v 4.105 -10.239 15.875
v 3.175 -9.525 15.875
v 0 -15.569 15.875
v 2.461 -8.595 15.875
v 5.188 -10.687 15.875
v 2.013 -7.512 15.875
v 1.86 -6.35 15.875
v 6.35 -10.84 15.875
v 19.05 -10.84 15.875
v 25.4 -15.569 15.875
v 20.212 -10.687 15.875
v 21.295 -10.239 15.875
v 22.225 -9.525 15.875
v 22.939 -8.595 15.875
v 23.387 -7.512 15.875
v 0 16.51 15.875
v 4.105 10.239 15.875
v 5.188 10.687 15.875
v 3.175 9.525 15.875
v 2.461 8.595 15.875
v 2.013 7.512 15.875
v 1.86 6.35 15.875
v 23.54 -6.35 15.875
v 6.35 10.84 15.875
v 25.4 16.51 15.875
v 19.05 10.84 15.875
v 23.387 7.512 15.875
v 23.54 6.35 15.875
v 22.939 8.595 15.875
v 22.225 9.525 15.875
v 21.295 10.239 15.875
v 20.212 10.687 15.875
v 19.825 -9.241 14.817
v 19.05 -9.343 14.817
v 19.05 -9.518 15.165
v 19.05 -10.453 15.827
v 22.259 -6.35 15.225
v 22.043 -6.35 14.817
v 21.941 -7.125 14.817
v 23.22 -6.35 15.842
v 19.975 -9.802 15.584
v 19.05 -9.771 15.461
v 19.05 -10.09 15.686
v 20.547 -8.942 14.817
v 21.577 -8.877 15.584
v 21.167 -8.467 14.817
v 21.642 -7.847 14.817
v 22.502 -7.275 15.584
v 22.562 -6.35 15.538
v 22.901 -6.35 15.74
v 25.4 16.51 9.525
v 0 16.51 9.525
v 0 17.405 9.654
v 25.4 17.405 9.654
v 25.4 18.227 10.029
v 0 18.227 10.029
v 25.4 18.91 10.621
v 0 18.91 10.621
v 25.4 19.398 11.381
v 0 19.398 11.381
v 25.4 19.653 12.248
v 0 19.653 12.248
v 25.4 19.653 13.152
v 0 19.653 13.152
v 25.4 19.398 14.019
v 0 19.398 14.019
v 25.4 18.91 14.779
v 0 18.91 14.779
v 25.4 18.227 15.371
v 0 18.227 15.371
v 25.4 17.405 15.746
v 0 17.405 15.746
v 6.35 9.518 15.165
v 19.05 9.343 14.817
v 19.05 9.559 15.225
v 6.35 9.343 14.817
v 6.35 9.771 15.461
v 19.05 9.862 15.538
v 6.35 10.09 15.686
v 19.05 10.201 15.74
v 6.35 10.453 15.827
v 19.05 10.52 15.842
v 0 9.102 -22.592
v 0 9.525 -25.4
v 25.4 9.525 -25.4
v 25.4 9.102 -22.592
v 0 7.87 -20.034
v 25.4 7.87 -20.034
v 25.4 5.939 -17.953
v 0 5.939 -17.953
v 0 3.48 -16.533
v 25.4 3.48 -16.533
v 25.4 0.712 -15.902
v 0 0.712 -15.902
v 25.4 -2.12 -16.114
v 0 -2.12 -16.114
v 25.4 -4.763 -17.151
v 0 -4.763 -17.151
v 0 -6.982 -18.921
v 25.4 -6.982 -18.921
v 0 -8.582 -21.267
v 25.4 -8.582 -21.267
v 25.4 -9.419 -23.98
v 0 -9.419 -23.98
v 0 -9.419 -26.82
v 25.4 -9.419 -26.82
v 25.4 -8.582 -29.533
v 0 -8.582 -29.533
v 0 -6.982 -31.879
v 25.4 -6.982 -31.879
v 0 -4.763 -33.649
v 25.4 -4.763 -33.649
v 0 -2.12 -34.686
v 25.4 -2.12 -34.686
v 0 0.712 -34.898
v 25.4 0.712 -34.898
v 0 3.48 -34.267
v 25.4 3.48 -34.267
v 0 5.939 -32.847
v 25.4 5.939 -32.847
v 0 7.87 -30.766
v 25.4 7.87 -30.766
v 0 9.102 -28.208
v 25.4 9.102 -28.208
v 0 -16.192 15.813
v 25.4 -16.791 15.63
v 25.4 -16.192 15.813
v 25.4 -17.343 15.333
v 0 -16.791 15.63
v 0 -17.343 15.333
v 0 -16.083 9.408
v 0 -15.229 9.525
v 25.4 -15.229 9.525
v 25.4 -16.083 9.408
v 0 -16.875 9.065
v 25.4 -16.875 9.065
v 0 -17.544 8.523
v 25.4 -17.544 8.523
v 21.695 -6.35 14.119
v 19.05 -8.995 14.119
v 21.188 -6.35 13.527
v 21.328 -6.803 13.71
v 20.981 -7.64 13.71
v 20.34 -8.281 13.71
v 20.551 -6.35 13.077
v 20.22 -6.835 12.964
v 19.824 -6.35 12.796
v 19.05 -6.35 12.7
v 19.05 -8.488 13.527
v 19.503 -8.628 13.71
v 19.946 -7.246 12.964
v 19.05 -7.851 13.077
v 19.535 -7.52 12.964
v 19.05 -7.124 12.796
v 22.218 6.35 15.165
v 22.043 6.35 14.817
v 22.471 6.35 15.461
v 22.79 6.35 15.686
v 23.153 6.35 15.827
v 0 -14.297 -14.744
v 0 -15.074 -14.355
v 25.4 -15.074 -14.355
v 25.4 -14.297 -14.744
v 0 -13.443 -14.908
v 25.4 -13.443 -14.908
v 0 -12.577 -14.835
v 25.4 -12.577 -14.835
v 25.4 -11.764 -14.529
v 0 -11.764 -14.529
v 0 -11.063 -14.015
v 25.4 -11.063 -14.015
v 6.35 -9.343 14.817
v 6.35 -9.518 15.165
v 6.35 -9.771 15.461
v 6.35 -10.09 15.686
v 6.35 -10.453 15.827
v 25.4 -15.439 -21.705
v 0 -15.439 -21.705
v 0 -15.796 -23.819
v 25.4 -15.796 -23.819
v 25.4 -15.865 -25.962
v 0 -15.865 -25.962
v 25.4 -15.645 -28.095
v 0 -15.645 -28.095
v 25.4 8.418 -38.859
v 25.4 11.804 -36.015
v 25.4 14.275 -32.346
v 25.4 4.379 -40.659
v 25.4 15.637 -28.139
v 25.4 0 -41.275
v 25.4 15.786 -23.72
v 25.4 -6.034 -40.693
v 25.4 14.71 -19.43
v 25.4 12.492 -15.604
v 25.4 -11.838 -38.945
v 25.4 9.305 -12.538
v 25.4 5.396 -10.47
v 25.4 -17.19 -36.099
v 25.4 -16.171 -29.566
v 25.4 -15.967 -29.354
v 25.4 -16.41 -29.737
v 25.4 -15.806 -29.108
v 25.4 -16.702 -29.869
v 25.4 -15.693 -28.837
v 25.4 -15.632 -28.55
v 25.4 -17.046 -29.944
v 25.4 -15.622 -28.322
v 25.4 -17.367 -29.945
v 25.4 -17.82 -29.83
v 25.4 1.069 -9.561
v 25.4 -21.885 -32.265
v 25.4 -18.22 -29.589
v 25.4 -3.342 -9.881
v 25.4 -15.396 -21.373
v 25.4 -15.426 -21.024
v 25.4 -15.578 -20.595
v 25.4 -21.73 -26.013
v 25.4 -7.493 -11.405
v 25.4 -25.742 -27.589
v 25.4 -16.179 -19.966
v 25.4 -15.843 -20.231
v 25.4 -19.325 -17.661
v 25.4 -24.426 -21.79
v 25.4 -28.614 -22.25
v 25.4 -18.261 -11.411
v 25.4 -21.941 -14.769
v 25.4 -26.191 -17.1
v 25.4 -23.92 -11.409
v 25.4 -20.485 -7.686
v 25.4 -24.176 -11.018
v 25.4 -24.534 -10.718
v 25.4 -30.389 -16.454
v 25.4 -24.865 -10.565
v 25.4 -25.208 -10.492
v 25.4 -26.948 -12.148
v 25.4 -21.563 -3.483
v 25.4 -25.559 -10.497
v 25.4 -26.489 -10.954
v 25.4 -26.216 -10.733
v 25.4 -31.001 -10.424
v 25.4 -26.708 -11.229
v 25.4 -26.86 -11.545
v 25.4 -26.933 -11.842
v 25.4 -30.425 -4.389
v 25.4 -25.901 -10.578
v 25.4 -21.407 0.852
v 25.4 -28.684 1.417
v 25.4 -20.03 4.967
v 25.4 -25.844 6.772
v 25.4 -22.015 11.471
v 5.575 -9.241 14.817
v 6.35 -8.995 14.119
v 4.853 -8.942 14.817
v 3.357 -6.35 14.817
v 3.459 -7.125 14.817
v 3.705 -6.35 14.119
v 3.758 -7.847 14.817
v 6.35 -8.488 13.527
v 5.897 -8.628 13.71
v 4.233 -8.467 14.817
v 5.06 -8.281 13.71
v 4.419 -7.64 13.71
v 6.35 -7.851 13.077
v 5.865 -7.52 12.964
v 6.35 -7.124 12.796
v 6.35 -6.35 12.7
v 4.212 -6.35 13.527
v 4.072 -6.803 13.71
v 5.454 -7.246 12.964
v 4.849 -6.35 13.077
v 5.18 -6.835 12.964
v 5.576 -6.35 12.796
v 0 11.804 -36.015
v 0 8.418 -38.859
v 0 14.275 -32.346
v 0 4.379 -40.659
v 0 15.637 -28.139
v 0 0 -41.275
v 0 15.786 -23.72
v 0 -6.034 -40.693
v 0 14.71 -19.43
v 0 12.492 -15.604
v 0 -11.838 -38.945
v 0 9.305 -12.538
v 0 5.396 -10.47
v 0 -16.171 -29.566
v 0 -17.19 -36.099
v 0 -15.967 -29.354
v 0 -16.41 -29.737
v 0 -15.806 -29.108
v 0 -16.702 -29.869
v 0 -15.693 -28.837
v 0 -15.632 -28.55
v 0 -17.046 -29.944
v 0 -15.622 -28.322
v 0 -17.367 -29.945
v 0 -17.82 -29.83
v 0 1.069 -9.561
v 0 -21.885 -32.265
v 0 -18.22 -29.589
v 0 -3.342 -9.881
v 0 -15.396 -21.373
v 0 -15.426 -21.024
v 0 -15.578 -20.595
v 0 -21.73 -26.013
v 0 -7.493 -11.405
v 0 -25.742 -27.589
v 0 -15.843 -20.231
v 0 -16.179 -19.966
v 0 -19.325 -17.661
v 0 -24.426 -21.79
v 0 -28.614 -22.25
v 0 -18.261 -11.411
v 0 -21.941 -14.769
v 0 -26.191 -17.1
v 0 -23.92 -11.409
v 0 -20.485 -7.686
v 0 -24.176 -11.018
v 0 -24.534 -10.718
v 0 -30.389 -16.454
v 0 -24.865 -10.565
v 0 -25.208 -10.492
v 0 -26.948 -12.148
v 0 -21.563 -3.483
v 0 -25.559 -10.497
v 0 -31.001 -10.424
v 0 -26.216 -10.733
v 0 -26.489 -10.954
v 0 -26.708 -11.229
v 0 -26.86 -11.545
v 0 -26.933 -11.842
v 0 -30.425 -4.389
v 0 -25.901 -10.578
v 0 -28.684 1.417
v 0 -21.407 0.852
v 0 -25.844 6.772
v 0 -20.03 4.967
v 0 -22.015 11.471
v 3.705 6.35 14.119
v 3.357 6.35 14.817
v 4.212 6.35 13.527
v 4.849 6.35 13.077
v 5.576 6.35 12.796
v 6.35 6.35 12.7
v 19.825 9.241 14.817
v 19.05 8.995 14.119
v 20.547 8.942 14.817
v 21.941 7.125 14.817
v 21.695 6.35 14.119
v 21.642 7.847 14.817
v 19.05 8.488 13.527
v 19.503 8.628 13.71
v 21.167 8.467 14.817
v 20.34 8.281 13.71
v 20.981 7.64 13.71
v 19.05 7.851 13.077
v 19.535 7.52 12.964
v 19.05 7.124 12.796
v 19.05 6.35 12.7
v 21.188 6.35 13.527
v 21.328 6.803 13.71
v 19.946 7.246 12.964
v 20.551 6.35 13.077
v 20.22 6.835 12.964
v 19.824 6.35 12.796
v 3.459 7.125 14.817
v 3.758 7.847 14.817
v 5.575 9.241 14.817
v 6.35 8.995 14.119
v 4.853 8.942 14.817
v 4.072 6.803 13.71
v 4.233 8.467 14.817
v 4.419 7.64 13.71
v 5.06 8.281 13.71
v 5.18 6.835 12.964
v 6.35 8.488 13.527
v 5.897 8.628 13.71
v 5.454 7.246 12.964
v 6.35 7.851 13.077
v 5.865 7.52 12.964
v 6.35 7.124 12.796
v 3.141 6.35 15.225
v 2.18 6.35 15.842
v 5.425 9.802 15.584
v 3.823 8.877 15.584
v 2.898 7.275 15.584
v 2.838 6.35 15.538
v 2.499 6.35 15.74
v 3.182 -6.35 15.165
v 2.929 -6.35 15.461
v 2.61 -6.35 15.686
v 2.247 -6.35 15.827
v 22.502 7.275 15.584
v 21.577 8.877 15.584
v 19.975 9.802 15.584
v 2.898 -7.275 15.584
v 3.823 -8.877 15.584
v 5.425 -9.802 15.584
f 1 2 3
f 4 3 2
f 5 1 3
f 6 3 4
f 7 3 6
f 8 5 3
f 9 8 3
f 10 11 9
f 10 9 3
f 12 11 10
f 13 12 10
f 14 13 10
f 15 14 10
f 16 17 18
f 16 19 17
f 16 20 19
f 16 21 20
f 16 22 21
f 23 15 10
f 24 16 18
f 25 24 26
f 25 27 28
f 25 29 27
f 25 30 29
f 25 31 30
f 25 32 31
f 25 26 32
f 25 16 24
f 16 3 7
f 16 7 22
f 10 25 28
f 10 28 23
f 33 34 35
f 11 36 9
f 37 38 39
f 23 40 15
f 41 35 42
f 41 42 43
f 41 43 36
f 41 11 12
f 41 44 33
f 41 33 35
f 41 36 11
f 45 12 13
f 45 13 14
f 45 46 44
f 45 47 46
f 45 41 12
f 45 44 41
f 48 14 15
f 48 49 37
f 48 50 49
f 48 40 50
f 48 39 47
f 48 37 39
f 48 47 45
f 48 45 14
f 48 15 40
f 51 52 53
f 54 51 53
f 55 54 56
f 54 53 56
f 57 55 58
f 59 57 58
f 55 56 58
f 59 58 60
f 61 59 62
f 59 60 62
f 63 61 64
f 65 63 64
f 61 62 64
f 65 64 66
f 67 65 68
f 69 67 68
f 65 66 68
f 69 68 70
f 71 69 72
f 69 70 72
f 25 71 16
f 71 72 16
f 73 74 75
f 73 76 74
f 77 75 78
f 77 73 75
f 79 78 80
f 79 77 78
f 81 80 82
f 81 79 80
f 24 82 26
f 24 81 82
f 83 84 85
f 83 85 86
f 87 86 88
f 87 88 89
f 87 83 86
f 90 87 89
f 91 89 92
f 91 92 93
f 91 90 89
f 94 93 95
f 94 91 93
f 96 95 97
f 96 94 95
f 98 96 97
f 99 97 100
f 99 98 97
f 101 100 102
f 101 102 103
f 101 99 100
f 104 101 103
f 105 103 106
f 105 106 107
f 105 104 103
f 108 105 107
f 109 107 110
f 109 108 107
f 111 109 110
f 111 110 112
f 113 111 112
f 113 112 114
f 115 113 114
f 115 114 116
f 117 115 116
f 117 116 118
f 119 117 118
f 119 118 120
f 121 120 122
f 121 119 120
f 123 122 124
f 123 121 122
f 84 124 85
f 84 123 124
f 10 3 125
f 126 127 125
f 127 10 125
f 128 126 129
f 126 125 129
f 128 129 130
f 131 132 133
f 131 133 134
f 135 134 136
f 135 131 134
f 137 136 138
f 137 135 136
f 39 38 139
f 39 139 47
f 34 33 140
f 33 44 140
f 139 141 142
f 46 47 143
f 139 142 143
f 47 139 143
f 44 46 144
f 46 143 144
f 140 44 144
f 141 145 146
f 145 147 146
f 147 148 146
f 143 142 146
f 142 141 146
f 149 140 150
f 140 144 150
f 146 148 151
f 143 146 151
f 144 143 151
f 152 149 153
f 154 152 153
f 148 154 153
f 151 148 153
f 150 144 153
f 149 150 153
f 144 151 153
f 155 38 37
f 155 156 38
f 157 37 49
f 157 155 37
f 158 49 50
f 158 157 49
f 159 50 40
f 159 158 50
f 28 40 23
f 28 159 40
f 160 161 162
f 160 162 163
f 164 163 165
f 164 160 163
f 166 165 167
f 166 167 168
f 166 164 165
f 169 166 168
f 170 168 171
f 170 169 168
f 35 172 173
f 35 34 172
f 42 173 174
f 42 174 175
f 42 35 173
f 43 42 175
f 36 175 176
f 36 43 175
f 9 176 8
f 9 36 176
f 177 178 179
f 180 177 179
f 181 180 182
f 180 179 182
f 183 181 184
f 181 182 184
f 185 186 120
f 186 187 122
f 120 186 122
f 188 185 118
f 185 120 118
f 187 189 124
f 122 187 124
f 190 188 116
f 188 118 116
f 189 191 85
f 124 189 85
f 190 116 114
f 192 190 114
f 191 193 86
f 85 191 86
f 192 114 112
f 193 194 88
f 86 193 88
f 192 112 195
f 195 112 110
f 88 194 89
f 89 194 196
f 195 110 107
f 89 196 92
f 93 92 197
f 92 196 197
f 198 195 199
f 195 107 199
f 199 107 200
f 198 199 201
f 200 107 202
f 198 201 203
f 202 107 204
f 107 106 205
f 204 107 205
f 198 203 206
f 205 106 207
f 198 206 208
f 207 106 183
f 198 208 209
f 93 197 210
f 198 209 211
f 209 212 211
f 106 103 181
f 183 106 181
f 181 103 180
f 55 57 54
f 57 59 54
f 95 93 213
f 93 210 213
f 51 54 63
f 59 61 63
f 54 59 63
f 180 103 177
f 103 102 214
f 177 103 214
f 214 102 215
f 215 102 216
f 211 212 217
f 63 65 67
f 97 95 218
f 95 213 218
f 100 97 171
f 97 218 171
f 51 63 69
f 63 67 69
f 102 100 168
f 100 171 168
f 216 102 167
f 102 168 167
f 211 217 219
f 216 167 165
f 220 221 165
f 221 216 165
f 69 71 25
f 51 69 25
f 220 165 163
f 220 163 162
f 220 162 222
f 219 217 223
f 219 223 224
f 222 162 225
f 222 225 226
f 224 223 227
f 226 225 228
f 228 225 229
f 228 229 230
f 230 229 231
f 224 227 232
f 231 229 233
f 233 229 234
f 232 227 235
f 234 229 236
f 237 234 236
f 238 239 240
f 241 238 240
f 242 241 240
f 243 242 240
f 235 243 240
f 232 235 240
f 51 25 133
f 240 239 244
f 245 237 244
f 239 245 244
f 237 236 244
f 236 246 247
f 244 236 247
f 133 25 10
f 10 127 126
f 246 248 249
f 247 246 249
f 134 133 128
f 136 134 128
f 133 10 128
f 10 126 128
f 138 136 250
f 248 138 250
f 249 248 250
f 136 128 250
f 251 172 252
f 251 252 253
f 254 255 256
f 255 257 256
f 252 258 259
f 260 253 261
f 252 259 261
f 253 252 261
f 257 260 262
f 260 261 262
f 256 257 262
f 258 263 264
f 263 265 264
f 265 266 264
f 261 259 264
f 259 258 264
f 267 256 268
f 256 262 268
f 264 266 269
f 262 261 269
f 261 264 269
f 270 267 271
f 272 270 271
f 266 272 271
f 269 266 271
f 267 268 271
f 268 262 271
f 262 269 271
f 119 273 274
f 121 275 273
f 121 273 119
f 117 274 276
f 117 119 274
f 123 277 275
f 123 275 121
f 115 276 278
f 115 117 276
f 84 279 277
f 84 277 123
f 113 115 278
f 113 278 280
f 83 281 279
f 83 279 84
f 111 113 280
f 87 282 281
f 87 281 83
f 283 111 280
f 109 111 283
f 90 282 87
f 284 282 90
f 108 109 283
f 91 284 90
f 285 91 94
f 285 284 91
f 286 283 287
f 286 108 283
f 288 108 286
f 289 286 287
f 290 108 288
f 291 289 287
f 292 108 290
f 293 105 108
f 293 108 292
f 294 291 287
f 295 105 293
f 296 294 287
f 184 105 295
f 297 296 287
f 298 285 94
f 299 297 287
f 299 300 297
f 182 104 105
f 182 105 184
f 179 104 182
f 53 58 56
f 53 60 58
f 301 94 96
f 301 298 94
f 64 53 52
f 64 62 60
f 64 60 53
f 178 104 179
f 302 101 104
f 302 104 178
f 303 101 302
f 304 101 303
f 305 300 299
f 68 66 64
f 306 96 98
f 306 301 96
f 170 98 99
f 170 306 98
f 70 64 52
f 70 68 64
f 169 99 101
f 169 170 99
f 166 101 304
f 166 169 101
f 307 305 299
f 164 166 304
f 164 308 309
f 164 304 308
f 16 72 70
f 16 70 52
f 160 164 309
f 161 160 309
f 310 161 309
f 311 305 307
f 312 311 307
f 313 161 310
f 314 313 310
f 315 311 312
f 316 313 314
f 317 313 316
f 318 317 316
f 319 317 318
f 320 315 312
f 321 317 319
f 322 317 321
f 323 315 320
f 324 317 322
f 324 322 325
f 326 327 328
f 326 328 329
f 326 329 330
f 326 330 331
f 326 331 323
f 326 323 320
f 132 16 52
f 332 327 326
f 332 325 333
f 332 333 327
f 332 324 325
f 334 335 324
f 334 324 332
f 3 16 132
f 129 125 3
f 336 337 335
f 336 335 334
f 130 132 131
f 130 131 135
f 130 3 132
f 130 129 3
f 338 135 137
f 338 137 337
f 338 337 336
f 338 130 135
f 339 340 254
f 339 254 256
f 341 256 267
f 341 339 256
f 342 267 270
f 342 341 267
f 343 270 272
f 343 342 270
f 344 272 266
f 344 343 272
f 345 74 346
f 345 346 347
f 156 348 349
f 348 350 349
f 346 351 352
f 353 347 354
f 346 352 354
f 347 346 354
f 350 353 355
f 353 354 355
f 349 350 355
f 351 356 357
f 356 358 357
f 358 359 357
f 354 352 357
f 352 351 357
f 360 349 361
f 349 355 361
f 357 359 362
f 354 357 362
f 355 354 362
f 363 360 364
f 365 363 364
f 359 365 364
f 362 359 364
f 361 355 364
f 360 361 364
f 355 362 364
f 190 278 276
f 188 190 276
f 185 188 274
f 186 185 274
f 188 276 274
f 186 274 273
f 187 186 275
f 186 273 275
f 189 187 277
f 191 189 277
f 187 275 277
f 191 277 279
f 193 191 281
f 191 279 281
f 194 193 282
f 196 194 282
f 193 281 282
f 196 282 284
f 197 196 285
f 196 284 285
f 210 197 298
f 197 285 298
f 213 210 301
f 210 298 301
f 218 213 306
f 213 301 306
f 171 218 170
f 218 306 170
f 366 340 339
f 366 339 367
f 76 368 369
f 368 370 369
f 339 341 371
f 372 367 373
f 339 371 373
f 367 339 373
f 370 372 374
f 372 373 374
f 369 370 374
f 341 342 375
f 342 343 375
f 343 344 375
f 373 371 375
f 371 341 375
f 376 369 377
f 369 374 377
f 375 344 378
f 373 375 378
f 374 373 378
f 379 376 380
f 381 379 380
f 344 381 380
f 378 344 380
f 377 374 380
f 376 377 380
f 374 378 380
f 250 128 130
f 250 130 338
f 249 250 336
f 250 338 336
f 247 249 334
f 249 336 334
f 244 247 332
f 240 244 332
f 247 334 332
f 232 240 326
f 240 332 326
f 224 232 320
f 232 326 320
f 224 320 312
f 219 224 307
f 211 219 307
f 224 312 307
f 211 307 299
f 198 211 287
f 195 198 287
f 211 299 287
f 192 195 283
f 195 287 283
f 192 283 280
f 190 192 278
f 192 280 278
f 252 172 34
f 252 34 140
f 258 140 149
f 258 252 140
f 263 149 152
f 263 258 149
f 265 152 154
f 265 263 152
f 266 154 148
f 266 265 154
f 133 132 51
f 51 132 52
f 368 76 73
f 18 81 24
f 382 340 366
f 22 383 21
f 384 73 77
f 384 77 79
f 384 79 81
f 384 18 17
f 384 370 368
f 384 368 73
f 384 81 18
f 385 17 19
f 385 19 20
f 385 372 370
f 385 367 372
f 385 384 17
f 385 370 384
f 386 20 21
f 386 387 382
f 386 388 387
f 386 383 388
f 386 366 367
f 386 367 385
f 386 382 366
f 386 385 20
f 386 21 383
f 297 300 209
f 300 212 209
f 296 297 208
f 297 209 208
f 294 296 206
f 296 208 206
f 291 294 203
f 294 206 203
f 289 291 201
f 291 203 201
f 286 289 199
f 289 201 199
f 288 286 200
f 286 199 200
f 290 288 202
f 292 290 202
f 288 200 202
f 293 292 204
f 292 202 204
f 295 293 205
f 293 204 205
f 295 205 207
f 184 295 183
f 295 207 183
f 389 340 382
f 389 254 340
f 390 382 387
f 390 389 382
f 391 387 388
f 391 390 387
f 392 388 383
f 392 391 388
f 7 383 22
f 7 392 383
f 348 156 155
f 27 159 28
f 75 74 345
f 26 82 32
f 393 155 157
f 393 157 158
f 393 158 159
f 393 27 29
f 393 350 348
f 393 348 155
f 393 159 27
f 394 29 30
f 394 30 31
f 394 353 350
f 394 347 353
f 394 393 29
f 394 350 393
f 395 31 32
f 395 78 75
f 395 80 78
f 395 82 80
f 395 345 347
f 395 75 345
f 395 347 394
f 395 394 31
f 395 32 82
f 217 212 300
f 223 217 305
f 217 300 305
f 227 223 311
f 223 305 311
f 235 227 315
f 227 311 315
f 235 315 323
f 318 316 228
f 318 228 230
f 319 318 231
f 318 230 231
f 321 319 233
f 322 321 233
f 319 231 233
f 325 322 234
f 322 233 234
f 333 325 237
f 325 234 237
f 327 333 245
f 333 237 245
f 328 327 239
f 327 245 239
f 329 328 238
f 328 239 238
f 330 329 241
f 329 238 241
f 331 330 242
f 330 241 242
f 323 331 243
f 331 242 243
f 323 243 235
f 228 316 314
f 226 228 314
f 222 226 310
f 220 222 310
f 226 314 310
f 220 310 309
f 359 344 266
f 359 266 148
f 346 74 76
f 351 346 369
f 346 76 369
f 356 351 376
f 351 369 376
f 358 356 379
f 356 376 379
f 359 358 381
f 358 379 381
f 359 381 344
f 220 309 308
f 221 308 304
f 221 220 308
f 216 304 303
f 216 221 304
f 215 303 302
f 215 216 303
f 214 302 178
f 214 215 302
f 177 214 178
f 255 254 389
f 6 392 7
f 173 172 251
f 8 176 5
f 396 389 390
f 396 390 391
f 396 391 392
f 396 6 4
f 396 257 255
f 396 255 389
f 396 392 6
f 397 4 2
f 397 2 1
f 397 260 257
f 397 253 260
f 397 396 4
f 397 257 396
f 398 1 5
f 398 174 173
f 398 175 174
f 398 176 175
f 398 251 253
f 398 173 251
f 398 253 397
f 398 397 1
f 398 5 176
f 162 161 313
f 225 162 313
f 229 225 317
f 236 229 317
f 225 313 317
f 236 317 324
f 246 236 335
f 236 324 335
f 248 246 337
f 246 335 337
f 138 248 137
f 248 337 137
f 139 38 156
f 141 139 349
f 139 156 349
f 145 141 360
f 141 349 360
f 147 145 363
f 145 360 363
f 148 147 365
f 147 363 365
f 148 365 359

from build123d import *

# Parameters (mm, degrees)
F0_R         = 9.525
F1_DEPTH     = 25.4
F2_W         = 19.05
F2_H         = 19.05
F3_DEPTH     = 3.175
F4_T1_DEPTH  = 25.4
F4_T3_DEPTH  = 12.7
F4_T5_DEPTH  = 12.7
F4_S9_W      = 3.175
F4_S9_H      = 3.175
F4_T10_DEPTH = 3.175
F4_S15_W     = 3.175
F4_S15_H     = 3.175
F4_T16_DEPTH = 3.175
F4_S21_W     = 3.175
F4_S21_H     = 3.175
F4_T22_DEPTH = 3.175
F4_S27_W     = 3.175
F4_S27_H     = 3.175
F4_T28_DEPTH = 3.175
F4_T31_DEPTH = 30.3662191739
F5_R         = 1.5875


# Not quite as in the source:
# - a fillet or chamfer that OpenCascade refuses, or shapes differently, is made with other operations: its cross-section is extruded or revolved along the edge and cut away or added


with BuildPart() as f1:
    # F0 (on Right) → F1 (new body)
    with BuildSketch(Plane.YZ):
        with BuildLine():
            Line((16.51, 15.875), (-16.51, 15.875))
            ThreePointArc((-16.51, 15.875), (-29.7854143214, -18.9198974706), (0, -41.275))
            ThreePointArc((0, -41.275), (14.2378547718, -18.3786670428), (-12.5944842771, -15.7359123145))
            ThreePointArc((-12.5944842771, -15.7359123145), (-21.4720341133, -4.1780442704), (-16.51, 9.525))
            Line((-16.51, 9.525), (16.51, 9.525))
            ThreePointArc((16.51, 9.525), (19.685, 12.7), (16.51, 15.875))
        make_face()
        with BuildLine():
            ThreePointArc((-14.343097751, -32.2037615996), (-25.3220142156, -19.7737801421), (-25.6780404598, -3.1932406127))
            ThreePointArc((-25.6780404598, -3.1932406127), (-22.8730710881, -13.3775496244), (-15.115016679, -20.5469704521))
            ThreePointArc((-15.115016679, -20.5469704521), (-15.8403068596, -26.4489535701), (-14.343097751, -32.2037615996))
        make_face(mode=Mode.SUBTRACT)
        with Locations((0, -25.4)):
            Circle(F0_R, mode=Mode.SUBTRACT)
    extrude(amount=F1_DEPTH)

    # F2 (on face) → F3 (cut)
    with BuildSketch(Plane.XY.offset(15.875)):
        with Locations((12.7, 0)):
            Rectangle(F2_W, F2_H)
    extrude(amount=-F3_DEPTH, mode=Mode.SUBTRACT)

    # F4: fillet of radius 3.175 on 11 edges, made by hand

    # F4_s2 → F4_t1 (join)
    with BuildSketch(Plane.YZ):
        with BuildLine():
            ThreePointArc((-15.229163377, 9.525), (-16.4906498384, 9.2636363719), (-17.5444470536, 8.5225760049))
            ThreePointArc((-17.5444470536, 8.5225760049), (-17.0391316289, 9.0360765162), (-16.51, 9.525))
            Line((-16.51, 9.525), (-15.229163377, 9.525))
        make_face()
        with BuildLine():
            ThreePointArc((-15.0737959989, -14.3545542957), (-13.0077413525, -14.9014210416), (-11.0631237972, -14.0147939479))
            ThreePointArc((-11.0631237972, -14.0147939479), (-11.8600660646, -14.8475378256), (-12.5944842771, -15.7359123145))
            ThreePointArc((-12.5944842771, -15.7359123145), (-13.8665248674, -15.1033585978), (-15.0737959989, -14.3545542957))
        make_face()
    extrude(amount=F4_T1_DEPTH)

    # F4_s4 → F4_t3 (join)
    with BuildSketch(Plane.YZ.offset(6.35)):
        with BuildLine():
            ThreePointArc((9.525, 15.875), (8.5950640303, 13.6299359697), (6.35, 12.7))
            Line((6.35, 12.7), (9.525, 12.7))
            Line((9.525, 12.7), (9.525, 15.875))
        make_face()
        with BuildLine():
            ThreePointArc((-9.525, 15.875), (-8.5950640303, 13.6299359697), (-6.35, 12.7))
            Line((-6.35, 12.7), (-9.525, 12.7))
            Line((-9.525, 12.7), (-9.525, 15.875))
        make_face()
    extrude(amount=F4_T3_DEPTH)

    # F4_s6 → F4_t5 (join)
    with BuildSketch(Plane.XZ.offset(-6.35)):
        with BuildLine():
            ThreePointArc((3.175, 15.875), (4.1049359697, 13.6299359697), (6.35, 12.7))
            Line((6.35, 12.7), (3.175, 12.7))
            Line((3.175, 12.7), (3.175, 15.875))
        make_face()
        with BuildLine():
            ThreePointArc((22.225, 15.875), (21.2950640303, 13.6299359697), (19.05, 12.7))
            Line((19.05, 12.7), (22.225, 12.7))
            Line((22.225, 12.7), (22.225, 15.875))
        make_face()
    extrude(amount=F4_T5_DEPTH)


with BuildPart() as f4_tool8:
    # F4_s9 → F4_t10 (new body)
    with BuildSketch(Plane.XY.offset(15.875)):
        with Locations((20.6375, 7.9375)):
            Rectangle(F4_S9_W, F4_S9_H)
    extrude(amount=-F4_T10_DEPTH)

    # F4_s11 → F4_t12 (revolve, cut)
    with BuildSketch(Plane(origin=(19.05, 6.35, 15.875), x_dir=(-0.7071067812, -0.7071067812, 0), z_dir=(0.7071067812, -0.7071067812, 0))):
        with BuildLine():
            ThreePointArc((0, -3.175), (3.175, 0), (0, 3.175))
            Line((0, 3.175), (0, -3.175))
        make_face()
    revolve(axis=Axis((19.05, 6.35, 15.875), (0, 0, -1)), mode=Mode.SUBTRACT)


with BuildPart() as f1_1:
    add(f1.part)

    # F4_t7: union F4_tool8
    add(f4_tool8.part)


with BuildPart() as f4_tool14:
    # F4_s15 → F4_t16 (new body)
    with BuildSketch(Plane.XY.offset(15.875)):
        with Locations((4.7625, 7.9375)):
            Rectangle(F4_S15_W, F4_S15_H)
    extrude(amount=-F4_T16_DEPTH)

    # F4_s17 → F4_t18 (revolve, cut)
    with BuildSketch(Plane(origin=(6.35, 6.35, 15.875), x_dir=(0.7071067812, -0.7071067812, 0), z_dir=(0.7071067812, 0.7071067812, 0))):
        with BuildLine():
            ThreePointArc((0, -3.175), (3.175, 0), (0, 3.175))
            Line((0, 3.175), (0, -3.175))
        make_face()
    revolve(axis=Axis((6.35, 6.35, 15.875), (0, 0, -1)), mode=Mode.SUBTRACT)


with BuildPart() as f1_2:
    add(f1_1.part)

    # F4_t13: union F4_tool14
    add(f4_tool14.part)


with BuildPart() as f4_tool20:
    # F4_s21 → F4_t22 (new body)
    with BuildSketch(Plane.XY.offset(15.875)):
        with Locations((4.7625, -7.9375)):
            Rectangle(F4_S21_W, F4_S21_H)
    extrude(amount=-F4_T22_DEPTH)

    # F4_s23 → F4_t24 (revolve, cut)
    with BuildSketch(Plane(origin=(6.35, -6.35, 15.875), x_dir=(0.7071067812, 0.7071067812, 0), z_dir=(-0.7071067812, 0.7071067812, 0))):
        with BuildLine():
            ThreePointArc((0, -3.175), (3.175, 0), (0, 3.175))
            Line((0, 3.175), (0, -3.175))
        make_face()
    revolve(axis=Axis((6.35, -6.35, 15.875), (0, 0, -1)), mode=Mode.SUBTRACT)


with BuildPart() as f1_3:
    add(f1_2.part)

    # F4_t19: union F4_tool20
    add(f4_tool20.part)


with BuildPart() as f4_tool26:
    # F4_s27 → F4_t28 (new body)
    with BuildSketch(Plane.XY.offset(15.875)):
        with Locations((20.6375, -7.9375)):
            Rectangle(F4_S27_W, F4_S27_H)
    extrude(amount=-F4_T28_DEPTH)

    # F4_s29 → F4_t30 (revolve, cut)
    with BuildSketch(Plane(origin=(19.05, -6.35, 15.875), x_dir=(-0.7071067812, 0.7071067812, 0), z_dir=(-0.7071067812, -0.7071067812, 0))):
        with BuildLine():
            ThreePointArc((0, -3.175), (3.175, 0), (0, 3.175))
            Line((0, 3.175), (0, -3.175))
        make_face()
    revolve(axis=Axis((19.05, -6.35, 15.875), (0, 0, -1)), mode=Mode.SUBTRACT)


with BuildPart() as f1_4:
    add(f1_3.part)

    # F4_t25: union F4_tool26
    add(f4_tool26.part)

    # F4_s32 → F4_t31 (cut)
    with BuildSketch(Plane.YZ.offset(-2.483109587)):
        with BuildLine():
            ThreePointArc((-15.5690922553, 15.875), (-16.4962795763, 15.7366015003), (-17.3426345609, 15.3334716042))
            ThreePointArc((-17.3426345609, 15.3334716042), (-16.9284902387, 15.6075768645), (-16.51, 15.875))
            Line((-16.51, 15.875), (-15.5690922553, 15.875))
        make_face()
    extrude(amount=F4_T31_DEPTH, mode=Mode.SUBTRACT)

    # F5
    f5_edges = [f1_4.edges().sort_by_distance(p)[0] for p in [
        (12.7, -9.525, 15.875),
        (3.175, 0, 15.875),
        (12.7, 9.525, 15.875),
        (22.225, 0, 15.875),
        (12.7, -15.115017, -20.54697),
        (12.7, -14.343098, -32.203762),
        (12.7, -25.67804, -3.193241),
        (21.295064, 8.595064, 15.875),
        (21.295064, -8.595064, 15.875),
        (4.104936, 8.595064, 15.875),
        (4.104936, -8.595064, 15.875),
    ]]
    fillet(f5_edges, radius=F5_R)


solid = f1_4.part
